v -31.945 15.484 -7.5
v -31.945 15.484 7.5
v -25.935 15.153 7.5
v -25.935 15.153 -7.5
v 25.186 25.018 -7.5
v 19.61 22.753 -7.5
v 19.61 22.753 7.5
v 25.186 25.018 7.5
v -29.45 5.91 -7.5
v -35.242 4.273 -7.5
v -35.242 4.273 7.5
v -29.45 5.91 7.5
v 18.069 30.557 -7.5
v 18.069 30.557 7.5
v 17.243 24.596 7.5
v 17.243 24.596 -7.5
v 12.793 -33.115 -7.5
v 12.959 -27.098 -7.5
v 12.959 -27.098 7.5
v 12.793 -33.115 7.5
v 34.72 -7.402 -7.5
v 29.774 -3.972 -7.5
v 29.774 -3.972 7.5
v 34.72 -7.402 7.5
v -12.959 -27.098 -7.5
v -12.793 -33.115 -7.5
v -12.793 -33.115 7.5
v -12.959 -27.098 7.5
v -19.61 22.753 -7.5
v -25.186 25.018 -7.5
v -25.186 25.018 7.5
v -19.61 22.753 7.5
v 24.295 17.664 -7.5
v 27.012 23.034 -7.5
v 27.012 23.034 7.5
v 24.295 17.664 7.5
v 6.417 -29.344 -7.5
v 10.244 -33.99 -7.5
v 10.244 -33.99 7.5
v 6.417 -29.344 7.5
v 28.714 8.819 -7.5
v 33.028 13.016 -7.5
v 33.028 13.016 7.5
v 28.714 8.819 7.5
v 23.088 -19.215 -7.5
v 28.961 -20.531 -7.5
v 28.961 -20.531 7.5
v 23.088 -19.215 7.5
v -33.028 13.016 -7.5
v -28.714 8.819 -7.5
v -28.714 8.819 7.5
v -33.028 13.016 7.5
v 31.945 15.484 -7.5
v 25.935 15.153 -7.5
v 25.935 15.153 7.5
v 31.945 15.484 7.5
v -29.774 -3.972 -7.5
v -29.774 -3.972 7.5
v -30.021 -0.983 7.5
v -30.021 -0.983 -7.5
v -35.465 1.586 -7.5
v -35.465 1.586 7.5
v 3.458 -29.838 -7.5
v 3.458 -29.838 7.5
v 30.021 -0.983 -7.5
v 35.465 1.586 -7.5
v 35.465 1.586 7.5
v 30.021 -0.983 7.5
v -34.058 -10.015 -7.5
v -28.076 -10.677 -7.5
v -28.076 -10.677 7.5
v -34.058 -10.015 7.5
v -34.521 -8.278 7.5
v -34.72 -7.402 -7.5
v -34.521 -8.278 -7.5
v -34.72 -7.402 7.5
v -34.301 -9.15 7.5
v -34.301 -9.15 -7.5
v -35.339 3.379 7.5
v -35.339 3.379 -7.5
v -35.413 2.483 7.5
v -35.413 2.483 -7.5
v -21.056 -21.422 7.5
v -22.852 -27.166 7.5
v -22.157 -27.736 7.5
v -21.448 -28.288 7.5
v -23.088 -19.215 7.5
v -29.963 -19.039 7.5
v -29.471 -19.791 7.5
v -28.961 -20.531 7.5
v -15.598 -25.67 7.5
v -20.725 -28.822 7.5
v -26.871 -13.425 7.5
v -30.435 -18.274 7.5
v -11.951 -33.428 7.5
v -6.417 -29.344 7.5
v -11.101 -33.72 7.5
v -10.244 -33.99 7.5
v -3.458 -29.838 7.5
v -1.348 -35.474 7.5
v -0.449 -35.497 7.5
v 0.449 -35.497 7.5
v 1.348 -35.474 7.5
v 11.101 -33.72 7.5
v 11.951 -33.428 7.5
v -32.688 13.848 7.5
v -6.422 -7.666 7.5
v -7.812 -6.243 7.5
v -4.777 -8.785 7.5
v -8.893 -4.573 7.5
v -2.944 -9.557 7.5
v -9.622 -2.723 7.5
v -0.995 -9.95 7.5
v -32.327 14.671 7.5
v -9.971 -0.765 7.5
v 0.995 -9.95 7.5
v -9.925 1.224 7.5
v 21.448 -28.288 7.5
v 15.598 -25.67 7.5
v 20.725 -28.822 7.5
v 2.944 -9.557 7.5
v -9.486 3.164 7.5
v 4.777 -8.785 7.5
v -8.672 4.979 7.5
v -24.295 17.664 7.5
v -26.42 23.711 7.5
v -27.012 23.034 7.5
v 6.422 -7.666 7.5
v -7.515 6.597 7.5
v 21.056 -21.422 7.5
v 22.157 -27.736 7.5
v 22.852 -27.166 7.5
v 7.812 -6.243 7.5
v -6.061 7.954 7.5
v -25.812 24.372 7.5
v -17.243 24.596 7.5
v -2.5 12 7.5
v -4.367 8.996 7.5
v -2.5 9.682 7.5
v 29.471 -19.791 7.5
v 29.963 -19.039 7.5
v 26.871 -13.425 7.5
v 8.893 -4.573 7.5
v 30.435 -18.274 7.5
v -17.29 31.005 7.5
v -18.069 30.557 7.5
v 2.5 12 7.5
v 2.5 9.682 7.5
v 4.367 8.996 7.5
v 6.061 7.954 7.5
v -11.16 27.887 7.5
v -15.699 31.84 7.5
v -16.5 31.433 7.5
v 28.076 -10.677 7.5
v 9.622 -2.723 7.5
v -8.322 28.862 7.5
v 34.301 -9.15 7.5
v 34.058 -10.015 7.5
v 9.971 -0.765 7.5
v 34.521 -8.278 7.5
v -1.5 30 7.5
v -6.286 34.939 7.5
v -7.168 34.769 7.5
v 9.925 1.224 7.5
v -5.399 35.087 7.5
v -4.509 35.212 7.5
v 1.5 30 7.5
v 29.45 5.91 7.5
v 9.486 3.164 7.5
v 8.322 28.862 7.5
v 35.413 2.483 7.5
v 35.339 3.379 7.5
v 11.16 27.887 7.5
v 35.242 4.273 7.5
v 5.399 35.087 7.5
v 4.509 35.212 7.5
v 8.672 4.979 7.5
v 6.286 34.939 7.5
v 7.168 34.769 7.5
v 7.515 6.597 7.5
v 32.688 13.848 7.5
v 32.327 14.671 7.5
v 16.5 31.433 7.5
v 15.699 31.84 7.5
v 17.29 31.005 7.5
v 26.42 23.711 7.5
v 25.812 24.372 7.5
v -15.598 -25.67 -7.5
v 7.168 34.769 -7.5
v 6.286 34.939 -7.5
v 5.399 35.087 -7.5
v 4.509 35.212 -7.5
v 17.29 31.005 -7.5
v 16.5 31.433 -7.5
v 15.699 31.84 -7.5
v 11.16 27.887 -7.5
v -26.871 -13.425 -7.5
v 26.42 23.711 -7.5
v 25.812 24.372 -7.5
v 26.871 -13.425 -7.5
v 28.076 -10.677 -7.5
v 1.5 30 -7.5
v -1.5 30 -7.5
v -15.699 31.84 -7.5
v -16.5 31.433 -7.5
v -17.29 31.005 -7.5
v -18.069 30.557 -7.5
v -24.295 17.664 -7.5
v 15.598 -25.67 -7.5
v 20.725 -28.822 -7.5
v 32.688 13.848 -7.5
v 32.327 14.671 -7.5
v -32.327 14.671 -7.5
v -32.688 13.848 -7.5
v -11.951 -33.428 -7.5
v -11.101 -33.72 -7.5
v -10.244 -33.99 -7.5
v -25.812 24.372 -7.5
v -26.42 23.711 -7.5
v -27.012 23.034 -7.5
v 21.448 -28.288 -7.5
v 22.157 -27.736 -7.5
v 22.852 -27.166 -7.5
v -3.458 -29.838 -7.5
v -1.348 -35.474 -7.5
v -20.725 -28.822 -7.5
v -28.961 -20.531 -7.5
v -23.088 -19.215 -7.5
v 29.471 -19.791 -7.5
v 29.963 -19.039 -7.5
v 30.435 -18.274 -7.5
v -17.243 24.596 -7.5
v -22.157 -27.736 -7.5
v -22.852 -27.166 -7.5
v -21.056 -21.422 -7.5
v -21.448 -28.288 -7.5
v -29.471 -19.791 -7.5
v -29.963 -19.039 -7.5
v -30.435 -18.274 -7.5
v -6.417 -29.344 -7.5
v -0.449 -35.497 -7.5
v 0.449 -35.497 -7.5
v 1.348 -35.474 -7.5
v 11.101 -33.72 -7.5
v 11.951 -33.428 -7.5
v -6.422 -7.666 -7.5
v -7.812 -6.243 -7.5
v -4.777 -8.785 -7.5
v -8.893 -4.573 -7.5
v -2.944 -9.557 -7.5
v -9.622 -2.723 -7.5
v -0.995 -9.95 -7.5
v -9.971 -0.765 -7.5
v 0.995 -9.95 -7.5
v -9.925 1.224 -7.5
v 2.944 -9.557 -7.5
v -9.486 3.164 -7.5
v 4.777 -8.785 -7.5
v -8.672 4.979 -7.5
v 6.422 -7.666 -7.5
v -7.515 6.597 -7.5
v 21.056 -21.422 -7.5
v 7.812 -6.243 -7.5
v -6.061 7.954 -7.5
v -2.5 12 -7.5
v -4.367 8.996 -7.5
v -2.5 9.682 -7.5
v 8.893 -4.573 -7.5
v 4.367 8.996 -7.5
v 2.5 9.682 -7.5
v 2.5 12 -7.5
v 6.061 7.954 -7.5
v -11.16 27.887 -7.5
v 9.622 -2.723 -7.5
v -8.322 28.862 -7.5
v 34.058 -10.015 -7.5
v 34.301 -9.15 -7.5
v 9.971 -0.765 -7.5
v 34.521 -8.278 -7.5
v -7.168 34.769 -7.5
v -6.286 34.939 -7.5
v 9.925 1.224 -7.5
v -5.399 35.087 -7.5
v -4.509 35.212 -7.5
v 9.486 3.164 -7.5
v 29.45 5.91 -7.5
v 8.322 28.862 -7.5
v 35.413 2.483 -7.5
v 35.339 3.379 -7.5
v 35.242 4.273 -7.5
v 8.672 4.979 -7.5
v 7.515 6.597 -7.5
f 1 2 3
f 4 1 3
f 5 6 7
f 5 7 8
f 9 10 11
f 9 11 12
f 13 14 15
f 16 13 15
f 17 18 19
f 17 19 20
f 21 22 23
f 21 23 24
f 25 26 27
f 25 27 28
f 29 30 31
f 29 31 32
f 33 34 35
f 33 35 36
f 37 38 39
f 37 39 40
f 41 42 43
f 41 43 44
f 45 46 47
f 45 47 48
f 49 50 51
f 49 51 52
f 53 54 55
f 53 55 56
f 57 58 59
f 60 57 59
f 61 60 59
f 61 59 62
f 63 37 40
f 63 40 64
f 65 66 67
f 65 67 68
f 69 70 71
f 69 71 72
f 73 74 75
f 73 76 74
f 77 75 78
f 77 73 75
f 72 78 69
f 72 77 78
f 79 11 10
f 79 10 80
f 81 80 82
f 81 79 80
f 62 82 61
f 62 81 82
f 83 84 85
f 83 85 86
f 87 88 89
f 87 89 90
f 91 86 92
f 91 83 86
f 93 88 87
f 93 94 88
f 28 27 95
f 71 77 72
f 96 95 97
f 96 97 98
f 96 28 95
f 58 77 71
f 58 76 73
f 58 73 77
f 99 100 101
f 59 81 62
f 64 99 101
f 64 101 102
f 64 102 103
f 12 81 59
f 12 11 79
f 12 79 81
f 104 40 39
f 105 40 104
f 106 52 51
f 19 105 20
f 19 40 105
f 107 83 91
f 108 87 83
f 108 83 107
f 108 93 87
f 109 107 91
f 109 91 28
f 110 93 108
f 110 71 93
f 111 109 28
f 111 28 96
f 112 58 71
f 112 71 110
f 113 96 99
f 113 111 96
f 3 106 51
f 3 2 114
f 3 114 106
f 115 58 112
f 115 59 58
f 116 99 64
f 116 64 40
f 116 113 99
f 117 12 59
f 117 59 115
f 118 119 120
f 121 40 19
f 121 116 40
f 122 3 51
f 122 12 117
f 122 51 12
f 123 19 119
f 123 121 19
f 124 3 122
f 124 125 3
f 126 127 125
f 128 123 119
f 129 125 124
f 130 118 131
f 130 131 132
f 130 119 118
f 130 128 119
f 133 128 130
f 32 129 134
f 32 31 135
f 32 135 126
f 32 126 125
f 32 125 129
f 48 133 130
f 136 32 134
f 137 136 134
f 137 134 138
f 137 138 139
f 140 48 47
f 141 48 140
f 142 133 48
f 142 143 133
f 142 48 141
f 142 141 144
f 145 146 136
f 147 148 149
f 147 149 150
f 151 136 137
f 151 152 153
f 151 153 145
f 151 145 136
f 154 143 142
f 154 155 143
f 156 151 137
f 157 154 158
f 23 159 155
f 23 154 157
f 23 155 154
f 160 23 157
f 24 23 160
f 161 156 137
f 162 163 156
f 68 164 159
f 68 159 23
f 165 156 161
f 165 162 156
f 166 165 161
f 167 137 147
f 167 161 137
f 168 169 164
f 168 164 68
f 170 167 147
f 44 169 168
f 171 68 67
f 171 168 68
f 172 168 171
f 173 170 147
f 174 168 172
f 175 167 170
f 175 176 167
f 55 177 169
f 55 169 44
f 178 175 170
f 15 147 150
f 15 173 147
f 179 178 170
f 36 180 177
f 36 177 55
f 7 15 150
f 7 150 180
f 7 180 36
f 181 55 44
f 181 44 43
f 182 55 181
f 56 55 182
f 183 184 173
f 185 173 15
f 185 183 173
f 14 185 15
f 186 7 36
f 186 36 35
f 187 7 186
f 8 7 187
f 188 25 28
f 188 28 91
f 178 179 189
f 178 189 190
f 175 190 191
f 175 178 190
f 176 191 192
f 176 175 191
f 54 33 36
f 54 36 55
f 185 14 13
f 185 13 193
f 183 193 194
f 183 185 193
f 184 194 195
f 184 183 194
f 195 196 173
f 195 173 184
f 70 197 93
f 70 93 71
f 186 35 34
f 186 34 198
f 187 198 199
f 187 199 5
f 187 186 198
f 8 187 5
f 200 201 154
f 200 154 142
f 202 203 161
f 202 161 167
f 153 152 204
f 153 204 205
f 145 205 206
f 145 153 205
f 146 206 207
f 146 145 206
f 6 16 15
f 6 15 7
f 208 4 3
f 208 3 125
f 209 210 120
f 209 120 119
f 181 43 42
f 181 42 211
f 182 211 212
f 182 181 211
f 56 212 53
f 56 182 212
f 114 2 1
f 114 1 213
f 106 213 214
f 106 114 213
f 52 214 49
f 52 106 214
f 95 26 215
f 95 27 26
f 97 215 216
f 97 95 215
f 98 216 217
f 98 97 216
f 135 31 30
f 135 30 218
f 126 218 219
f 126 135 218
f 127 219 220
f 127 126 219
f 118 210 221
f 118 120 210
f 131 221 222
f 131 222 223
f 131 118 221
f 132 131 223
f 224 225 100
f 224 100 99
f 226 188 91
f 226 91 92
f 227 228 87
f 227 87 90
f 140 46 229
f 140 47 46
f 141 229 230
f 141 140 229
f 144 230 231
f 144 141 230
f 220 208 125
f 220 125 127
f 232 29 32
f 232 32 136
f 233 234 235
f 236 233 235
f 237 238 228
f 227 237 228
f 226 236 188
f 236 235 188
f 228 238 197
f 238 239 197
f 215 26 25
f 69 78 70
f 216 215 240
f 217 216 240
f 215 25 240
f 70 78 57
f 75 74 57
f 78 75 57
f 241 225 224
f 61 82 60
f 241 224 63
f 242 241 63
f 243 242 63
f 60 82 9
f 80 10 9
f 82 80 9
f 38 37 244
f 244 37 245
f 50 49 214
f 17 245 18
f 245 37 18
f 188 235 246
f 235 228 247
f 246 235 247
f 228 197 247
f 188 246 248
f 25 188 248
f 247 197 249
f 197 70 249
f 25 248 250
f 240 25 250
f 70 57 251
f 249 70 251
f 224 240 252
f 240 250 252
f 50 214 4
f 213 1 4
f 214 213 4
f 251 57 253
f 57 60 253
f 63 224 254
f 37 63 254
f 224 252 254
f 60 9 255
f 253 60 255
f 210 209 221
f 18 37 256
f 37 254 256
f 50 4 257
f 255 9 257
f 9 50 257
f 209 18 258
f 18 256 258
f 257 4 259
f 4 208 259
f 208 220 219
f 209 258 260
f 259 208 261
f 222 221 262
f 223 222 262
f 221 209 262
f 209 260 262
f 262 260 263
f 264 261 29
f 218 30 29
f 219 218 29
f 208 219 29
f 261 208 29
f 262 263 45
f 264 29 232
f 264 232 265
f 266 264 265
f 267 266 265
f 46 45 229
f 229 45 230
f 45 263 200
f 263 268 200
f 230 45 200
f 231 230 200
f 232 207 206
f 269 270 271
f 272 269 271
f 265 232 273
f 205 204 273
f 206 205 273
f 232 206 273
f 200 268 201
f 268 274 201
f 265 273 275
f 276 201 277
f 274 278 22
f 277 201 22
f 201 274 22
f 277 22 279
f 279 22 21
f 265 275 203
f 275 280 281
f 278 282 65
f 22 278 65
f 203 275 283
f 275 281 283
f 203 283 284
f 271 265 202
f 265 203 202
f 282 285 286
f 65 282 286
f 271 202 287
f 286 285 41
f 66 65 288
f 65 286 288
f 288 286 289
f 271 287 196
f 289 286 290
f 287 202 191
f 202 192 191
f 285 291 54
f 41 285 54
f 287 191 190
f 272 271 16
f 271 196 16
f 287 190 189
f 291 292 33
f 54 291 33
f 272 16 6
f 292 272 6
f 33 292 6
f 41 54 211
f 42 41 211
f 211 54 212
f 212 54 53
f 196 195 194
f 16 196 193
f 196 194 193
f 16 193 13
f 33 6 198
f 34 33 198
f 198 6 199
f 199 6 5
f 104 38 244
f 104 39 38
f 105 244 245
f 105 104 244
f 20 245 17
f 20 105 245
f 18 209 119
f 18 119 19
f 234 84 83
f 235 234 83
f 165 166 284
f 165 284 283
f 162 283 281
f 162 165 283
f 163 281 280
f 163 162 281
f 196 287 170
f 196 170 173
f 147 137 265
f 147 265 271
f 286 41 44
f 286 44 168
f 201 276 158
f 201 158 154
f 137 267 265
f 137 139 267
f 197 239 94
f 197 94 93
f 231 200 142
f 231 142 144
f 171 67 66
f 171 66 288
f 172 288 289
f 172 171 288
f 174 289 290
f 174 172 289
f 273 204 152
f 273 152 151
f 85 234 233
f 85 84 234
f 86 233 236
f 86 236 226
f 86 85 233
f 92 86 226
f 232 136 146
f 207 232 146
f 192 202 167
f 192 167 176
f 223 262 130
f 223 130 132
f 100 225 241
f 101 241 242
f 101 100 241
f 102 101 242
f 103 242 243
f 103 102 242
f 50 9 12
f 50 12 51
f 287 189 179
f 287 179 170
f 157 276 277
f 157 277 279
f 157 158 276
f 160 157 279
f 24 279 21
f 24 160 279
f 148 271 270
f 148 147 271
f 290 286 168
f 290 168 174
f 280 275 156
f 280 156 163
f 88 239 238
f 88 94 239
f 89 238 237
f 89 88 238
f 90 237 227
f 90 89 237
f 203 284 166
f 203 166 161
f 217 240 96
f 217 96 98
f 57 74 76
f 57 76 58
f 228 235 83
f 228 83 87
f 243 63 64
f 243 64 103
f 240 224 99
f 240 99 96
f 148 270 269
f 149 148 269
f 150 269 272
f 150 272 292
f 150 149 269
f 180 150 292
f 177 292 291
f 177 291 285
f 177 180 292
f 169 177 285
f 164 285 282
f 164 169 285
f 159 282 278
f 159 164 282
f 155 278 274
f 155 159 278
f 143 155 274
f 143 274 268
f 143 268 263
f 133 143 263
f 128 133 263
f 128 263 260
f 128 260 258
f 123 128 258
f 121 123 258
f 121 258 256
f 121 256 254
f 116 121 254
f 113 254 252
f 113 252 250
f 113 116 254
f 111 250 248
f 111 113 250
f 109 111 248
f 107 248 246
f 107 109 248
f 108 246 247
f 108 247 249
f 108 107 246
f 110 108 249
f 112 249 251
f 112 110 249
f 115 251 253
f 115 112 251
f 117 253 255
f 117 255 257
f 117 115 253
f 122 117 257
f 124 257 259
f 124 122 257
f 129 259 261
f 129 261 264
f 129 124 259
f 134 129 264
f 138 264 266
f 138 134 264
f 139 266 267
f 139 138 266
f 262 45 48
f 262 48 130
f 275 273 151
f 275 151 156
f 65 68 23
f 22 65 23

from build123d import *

# Parameters (mm, degrees)
SKETCH1_R           = 35.5
BOSS_EXTRUDE1_DEPTH = 7.5
SKETCH4_OUTSIDE_W   = 93.304
SKETCH4_OUTSIDE_H   = 93.304
CUT_EXTRUDE2_DEPTH  = 53.397519025


with BuildPart() as part:
    # Sketch1 → Boss-Extrude1 (new, symmetric)
    with BuildSketch(Plane.XY):
        Circle(SKETCH1_R)
        with BuildLine():
            Line((-2.5, 12), (2.5, 12))
            Line((2.5, 12), (2.5, 9.682458366))
            ThreePointArc((2.5, 9.682458366), (0, -10), (-2.5, 9.682458366))
            Line((-2.5, 9.682458366), (-2.5, 12))
        make_face(mode=Mode.SUBTRACT)
    extrude(amount=BOSS_EXTRUDE1_DEPTH, both=True)

    # Sketch4 outside → Cut-Extrude2 (cut, through all)
    with BuildSketch(Plane.XY.offset(7.5)):
        Rectangle(SKETCH4_OUTSIDE_W, SKETCH4_OUTSIDE_H)
        with BuildLine():
            Line((1.5, 30), (-1.5, 30))
            Line((-1.5, 30), (-4.509398661, 35.21243138))
            ThreePointArc((-4.509398661, 35.21243138), (-5.843107955, 35.015826271), (-7.168390776, 34.768724073))
            Line((-7.168390776, 34.768724073), (-8.322258214, 28.861566455))
            Line((-8.322258214, 28.861566455), (-11.159709939, 27.887468047))
            Line((-11.159709939, 27.887468047), (-15.698524782, 31.84032537))
            ThreePointArc((-15.698524782, 31.84032537), (-16.896132453, 31.221318168), (-18.069373842, 30.557286021))
            Line((-18.069373842, 30.557286021), (-17.242670617, 24.595534351))
            Line((-17.242670617, 24.595534351), (-19.610092145, 22.752896213))
            Line((-19.610092145, 22.752896213), (-25.186472155, 25.017826053))
            ThreePointArc((-25.186472155, 25.017826053), (-26.118198829, 24.043495793), (-27.012259878, 23.034491882))
            Line((-27.012259878, 23.034491882), (-24.294572111, 17.664194461))
            Line((-24.294572111, 17.664194461), (-25.935416585, 15.152695026))
            Line((-25.935416585, 15.152695026), (-31.945074461, 15.484257091))
            ThreePointArc((-31.945074461, 15.484257091), (-32.509953096, 14.260187575), (-33.027948418, 13.015553132))
            Line((-33.027948418, 13.015553132), (-28.713779747, 8.818665013))
            Line((-28.713779747, 8.818665013), (-29.450236209, 5.910464215))
            Line((-29.450236209, 5.910464215), (-35.241932271, 4.27272861))
            ThreePointArc((-35.241932271, 4.27272861), (-35.378749502, 2.931566764), (-35.464546265, 1.586177242))
            Line((-35.464546265, 1.586177242), (-30.021403808, -0.982503625))
            Line((-30.021403808, -0.982503625), (-29.773665772, -3.972257104))
            Line((-29.773665772, -3.972257104), (-34.719779885, -7.401816314))
            ThreePointArc((-34.719779885, -7.401816314), (-34.413709441, -8.714734794), (-34.058010235, -10.015085564))
            Line((-34.058010235, -10.015085564), (-28.075742937, -10.67720275))
            Line((-28.075742937, -10.67720275), (-26.870656663, -13.42452273))
            Line((-26.870656663, -13.42452273), (-30.435200615, -18.274259589))
            ThreePointArc((-30.435200615, -18.274259589), (-29.719409978, -19.416659613), (-28.960760331, -20.531058449))
            Line((-28.960760331, -20.531058449), (-23.087639678, -19.214861283))
            Line((-23.087639678, -19.214861283), (-21.055794963, -21.422033015))
            Line((-21.055794963, -21.422033015), (-22.852495108, -27.166403283))
            ThreePointArc((-22.852495108, -27.166403283), (-21.8045513, -28.014488084), (-20.725162674, -28.822172579))
            Line((-20.725162674, -28.822172579), (-15.597632418, -25.670291447))
            Line((-15.597632418, -25.670291447), (-12.959211164, -27.098133626))
            Line((-12.959211164, -27.098133626), (-12.793367162, -33.114645652))
            ThreePointArc((-12.793367162, -33.114645652), (-11.526831157, -33.57651208), (-10.243672056, -33.989957087))
            Line((-10.243672056, -33.989957087), (-6.417379664, -29.343947217))
            Line((-6.417379664, -29.343947217), (-3.458295753, -29.837730988))
            Line((-3.458295753, -29.837730988), (-1.347879375, -35.474402337))
            ThreePointArc((-1.347879375, -35.474402337), (0, -35.5), (1.347879375, -35.474402337))
            Line((1.347879375, -35.474402337), (3.458295753, -29.837730988))
            Line((3.458295753, -29.837730988), (6.417379664, -29.343947217))
            Line((6.417379664, -29.343947217), (10.243672056, -33.989957087))
            ThreePointArc((10.243672056, -33.989957087), (11.526831157, -33.57651208), (12.793367162, -33.114645652))
            Line((12.793367162, -33.114645652), (12.959211164, -27.098133626))
            Line((12.959211164, -27.098133626), (15.597632418, -25.670291447))
            Line((15.597632418, -25.670291447), (20.725162674, -28.822172579))
            ThreePointArc((20.725162674, -28.822172579), (21.8045513, -28.014488084), (22.852495108, -27.166403283))
            Line((22.852495108, -27.166403283), (21.055794963, -21.422033015))
            Line((21.055794963, -21.422033015), (23.087639678, -19.214861283))
            Line((23.087639678, -19.214861283), (28.960760331, -20.531058449))
            ThreePointArc((28.960760331, -20.531058449), (29.719409978, -19.416659613), (30.435200615, -18.274259589))
            Line((30.435200615, -18.274259589), (26.870656663, -13.42452273))
            Line((26.870656663, -13.42452273), (28.075742937, -10.67720275))
            Line((28.075742937, -10.67720275), (34.058010235, -10.015085564))
            ThreePointArc((34.058010235, -10.015085564), (34.413709441, -8.714734793), (34.719779885, -7.401816314))
            Line((34.719779885, -7.401816314), (29.773665772, -3.972257104))
            Line((29.773665772, -3.972257104), (30.021403808, -0.982503625))
            Line((30.021403808, -0.982503625), (35.464546265, 1.586177242))
            ThreePointArc((35.464546265, 1.586177242), (35.378749502, 2.931566764), (35.241932271, 4.27272861))
            Line((35.241932271, 4.27272861), (29.450236209, 5.910464215))
            Line((29.450236209, 5.910464215), (28.713779747, 8.818665013))
            Line((28.713779747, 8.818665013), (33.027948418, 13.015553132))
            ThreePointArc((33.027948418, 13.015553132), (32.509953096, 14.260187575), (31.945074461, 15.484257091))
            Line((31.945074461, 15.484257091), (25.935416585, 15.152695026))
            Line((25.935416585, 15.152695026), (24.294572111, 17.664194461))
            Line((24.294572111, 17.664194461), (27.012259878, 23.034491882))
            ThreePointArc((27.012259878, 23.034491882), (26.118198829, 24.043495793), (25.186472155, 25.017826053))
            Line((25.186472155, 25.017826053), (19.610092145, 22.752896213))
            Line((19.610092145, 22.752896213), (17.242670617, 24.595534351))
            Line((17.242670617, 24.595534351), (18.069373842, 30.557286021))
            ThreePointArc((18.069373842, 30.557286021), (16.896132453, 31.221318168), (15.698524782, 31.84032537))
            Line((15.698524782, 31.84032537), (11.159709939, 27.887468047))
            Line((11.159709939, 27.887468047), (8.322258214, 28.861566455))
            Line((8.322258214, 28.861566455), (7.168390776, 34.768724073))
            ThreePointArc((7.168390776, 34.768724073), (5.843107955, 35.015826271), (4.509398661, 35.21243138))
            Line((4.509398661, 35.21243138), (1.5, 30))
        make_face(mode=Mode.SUBTRACT)
    extrude(amount=-CUT_EXTRUDE2_DEPTH, mode=Mode.SUBTRACT)


solid = part.part
